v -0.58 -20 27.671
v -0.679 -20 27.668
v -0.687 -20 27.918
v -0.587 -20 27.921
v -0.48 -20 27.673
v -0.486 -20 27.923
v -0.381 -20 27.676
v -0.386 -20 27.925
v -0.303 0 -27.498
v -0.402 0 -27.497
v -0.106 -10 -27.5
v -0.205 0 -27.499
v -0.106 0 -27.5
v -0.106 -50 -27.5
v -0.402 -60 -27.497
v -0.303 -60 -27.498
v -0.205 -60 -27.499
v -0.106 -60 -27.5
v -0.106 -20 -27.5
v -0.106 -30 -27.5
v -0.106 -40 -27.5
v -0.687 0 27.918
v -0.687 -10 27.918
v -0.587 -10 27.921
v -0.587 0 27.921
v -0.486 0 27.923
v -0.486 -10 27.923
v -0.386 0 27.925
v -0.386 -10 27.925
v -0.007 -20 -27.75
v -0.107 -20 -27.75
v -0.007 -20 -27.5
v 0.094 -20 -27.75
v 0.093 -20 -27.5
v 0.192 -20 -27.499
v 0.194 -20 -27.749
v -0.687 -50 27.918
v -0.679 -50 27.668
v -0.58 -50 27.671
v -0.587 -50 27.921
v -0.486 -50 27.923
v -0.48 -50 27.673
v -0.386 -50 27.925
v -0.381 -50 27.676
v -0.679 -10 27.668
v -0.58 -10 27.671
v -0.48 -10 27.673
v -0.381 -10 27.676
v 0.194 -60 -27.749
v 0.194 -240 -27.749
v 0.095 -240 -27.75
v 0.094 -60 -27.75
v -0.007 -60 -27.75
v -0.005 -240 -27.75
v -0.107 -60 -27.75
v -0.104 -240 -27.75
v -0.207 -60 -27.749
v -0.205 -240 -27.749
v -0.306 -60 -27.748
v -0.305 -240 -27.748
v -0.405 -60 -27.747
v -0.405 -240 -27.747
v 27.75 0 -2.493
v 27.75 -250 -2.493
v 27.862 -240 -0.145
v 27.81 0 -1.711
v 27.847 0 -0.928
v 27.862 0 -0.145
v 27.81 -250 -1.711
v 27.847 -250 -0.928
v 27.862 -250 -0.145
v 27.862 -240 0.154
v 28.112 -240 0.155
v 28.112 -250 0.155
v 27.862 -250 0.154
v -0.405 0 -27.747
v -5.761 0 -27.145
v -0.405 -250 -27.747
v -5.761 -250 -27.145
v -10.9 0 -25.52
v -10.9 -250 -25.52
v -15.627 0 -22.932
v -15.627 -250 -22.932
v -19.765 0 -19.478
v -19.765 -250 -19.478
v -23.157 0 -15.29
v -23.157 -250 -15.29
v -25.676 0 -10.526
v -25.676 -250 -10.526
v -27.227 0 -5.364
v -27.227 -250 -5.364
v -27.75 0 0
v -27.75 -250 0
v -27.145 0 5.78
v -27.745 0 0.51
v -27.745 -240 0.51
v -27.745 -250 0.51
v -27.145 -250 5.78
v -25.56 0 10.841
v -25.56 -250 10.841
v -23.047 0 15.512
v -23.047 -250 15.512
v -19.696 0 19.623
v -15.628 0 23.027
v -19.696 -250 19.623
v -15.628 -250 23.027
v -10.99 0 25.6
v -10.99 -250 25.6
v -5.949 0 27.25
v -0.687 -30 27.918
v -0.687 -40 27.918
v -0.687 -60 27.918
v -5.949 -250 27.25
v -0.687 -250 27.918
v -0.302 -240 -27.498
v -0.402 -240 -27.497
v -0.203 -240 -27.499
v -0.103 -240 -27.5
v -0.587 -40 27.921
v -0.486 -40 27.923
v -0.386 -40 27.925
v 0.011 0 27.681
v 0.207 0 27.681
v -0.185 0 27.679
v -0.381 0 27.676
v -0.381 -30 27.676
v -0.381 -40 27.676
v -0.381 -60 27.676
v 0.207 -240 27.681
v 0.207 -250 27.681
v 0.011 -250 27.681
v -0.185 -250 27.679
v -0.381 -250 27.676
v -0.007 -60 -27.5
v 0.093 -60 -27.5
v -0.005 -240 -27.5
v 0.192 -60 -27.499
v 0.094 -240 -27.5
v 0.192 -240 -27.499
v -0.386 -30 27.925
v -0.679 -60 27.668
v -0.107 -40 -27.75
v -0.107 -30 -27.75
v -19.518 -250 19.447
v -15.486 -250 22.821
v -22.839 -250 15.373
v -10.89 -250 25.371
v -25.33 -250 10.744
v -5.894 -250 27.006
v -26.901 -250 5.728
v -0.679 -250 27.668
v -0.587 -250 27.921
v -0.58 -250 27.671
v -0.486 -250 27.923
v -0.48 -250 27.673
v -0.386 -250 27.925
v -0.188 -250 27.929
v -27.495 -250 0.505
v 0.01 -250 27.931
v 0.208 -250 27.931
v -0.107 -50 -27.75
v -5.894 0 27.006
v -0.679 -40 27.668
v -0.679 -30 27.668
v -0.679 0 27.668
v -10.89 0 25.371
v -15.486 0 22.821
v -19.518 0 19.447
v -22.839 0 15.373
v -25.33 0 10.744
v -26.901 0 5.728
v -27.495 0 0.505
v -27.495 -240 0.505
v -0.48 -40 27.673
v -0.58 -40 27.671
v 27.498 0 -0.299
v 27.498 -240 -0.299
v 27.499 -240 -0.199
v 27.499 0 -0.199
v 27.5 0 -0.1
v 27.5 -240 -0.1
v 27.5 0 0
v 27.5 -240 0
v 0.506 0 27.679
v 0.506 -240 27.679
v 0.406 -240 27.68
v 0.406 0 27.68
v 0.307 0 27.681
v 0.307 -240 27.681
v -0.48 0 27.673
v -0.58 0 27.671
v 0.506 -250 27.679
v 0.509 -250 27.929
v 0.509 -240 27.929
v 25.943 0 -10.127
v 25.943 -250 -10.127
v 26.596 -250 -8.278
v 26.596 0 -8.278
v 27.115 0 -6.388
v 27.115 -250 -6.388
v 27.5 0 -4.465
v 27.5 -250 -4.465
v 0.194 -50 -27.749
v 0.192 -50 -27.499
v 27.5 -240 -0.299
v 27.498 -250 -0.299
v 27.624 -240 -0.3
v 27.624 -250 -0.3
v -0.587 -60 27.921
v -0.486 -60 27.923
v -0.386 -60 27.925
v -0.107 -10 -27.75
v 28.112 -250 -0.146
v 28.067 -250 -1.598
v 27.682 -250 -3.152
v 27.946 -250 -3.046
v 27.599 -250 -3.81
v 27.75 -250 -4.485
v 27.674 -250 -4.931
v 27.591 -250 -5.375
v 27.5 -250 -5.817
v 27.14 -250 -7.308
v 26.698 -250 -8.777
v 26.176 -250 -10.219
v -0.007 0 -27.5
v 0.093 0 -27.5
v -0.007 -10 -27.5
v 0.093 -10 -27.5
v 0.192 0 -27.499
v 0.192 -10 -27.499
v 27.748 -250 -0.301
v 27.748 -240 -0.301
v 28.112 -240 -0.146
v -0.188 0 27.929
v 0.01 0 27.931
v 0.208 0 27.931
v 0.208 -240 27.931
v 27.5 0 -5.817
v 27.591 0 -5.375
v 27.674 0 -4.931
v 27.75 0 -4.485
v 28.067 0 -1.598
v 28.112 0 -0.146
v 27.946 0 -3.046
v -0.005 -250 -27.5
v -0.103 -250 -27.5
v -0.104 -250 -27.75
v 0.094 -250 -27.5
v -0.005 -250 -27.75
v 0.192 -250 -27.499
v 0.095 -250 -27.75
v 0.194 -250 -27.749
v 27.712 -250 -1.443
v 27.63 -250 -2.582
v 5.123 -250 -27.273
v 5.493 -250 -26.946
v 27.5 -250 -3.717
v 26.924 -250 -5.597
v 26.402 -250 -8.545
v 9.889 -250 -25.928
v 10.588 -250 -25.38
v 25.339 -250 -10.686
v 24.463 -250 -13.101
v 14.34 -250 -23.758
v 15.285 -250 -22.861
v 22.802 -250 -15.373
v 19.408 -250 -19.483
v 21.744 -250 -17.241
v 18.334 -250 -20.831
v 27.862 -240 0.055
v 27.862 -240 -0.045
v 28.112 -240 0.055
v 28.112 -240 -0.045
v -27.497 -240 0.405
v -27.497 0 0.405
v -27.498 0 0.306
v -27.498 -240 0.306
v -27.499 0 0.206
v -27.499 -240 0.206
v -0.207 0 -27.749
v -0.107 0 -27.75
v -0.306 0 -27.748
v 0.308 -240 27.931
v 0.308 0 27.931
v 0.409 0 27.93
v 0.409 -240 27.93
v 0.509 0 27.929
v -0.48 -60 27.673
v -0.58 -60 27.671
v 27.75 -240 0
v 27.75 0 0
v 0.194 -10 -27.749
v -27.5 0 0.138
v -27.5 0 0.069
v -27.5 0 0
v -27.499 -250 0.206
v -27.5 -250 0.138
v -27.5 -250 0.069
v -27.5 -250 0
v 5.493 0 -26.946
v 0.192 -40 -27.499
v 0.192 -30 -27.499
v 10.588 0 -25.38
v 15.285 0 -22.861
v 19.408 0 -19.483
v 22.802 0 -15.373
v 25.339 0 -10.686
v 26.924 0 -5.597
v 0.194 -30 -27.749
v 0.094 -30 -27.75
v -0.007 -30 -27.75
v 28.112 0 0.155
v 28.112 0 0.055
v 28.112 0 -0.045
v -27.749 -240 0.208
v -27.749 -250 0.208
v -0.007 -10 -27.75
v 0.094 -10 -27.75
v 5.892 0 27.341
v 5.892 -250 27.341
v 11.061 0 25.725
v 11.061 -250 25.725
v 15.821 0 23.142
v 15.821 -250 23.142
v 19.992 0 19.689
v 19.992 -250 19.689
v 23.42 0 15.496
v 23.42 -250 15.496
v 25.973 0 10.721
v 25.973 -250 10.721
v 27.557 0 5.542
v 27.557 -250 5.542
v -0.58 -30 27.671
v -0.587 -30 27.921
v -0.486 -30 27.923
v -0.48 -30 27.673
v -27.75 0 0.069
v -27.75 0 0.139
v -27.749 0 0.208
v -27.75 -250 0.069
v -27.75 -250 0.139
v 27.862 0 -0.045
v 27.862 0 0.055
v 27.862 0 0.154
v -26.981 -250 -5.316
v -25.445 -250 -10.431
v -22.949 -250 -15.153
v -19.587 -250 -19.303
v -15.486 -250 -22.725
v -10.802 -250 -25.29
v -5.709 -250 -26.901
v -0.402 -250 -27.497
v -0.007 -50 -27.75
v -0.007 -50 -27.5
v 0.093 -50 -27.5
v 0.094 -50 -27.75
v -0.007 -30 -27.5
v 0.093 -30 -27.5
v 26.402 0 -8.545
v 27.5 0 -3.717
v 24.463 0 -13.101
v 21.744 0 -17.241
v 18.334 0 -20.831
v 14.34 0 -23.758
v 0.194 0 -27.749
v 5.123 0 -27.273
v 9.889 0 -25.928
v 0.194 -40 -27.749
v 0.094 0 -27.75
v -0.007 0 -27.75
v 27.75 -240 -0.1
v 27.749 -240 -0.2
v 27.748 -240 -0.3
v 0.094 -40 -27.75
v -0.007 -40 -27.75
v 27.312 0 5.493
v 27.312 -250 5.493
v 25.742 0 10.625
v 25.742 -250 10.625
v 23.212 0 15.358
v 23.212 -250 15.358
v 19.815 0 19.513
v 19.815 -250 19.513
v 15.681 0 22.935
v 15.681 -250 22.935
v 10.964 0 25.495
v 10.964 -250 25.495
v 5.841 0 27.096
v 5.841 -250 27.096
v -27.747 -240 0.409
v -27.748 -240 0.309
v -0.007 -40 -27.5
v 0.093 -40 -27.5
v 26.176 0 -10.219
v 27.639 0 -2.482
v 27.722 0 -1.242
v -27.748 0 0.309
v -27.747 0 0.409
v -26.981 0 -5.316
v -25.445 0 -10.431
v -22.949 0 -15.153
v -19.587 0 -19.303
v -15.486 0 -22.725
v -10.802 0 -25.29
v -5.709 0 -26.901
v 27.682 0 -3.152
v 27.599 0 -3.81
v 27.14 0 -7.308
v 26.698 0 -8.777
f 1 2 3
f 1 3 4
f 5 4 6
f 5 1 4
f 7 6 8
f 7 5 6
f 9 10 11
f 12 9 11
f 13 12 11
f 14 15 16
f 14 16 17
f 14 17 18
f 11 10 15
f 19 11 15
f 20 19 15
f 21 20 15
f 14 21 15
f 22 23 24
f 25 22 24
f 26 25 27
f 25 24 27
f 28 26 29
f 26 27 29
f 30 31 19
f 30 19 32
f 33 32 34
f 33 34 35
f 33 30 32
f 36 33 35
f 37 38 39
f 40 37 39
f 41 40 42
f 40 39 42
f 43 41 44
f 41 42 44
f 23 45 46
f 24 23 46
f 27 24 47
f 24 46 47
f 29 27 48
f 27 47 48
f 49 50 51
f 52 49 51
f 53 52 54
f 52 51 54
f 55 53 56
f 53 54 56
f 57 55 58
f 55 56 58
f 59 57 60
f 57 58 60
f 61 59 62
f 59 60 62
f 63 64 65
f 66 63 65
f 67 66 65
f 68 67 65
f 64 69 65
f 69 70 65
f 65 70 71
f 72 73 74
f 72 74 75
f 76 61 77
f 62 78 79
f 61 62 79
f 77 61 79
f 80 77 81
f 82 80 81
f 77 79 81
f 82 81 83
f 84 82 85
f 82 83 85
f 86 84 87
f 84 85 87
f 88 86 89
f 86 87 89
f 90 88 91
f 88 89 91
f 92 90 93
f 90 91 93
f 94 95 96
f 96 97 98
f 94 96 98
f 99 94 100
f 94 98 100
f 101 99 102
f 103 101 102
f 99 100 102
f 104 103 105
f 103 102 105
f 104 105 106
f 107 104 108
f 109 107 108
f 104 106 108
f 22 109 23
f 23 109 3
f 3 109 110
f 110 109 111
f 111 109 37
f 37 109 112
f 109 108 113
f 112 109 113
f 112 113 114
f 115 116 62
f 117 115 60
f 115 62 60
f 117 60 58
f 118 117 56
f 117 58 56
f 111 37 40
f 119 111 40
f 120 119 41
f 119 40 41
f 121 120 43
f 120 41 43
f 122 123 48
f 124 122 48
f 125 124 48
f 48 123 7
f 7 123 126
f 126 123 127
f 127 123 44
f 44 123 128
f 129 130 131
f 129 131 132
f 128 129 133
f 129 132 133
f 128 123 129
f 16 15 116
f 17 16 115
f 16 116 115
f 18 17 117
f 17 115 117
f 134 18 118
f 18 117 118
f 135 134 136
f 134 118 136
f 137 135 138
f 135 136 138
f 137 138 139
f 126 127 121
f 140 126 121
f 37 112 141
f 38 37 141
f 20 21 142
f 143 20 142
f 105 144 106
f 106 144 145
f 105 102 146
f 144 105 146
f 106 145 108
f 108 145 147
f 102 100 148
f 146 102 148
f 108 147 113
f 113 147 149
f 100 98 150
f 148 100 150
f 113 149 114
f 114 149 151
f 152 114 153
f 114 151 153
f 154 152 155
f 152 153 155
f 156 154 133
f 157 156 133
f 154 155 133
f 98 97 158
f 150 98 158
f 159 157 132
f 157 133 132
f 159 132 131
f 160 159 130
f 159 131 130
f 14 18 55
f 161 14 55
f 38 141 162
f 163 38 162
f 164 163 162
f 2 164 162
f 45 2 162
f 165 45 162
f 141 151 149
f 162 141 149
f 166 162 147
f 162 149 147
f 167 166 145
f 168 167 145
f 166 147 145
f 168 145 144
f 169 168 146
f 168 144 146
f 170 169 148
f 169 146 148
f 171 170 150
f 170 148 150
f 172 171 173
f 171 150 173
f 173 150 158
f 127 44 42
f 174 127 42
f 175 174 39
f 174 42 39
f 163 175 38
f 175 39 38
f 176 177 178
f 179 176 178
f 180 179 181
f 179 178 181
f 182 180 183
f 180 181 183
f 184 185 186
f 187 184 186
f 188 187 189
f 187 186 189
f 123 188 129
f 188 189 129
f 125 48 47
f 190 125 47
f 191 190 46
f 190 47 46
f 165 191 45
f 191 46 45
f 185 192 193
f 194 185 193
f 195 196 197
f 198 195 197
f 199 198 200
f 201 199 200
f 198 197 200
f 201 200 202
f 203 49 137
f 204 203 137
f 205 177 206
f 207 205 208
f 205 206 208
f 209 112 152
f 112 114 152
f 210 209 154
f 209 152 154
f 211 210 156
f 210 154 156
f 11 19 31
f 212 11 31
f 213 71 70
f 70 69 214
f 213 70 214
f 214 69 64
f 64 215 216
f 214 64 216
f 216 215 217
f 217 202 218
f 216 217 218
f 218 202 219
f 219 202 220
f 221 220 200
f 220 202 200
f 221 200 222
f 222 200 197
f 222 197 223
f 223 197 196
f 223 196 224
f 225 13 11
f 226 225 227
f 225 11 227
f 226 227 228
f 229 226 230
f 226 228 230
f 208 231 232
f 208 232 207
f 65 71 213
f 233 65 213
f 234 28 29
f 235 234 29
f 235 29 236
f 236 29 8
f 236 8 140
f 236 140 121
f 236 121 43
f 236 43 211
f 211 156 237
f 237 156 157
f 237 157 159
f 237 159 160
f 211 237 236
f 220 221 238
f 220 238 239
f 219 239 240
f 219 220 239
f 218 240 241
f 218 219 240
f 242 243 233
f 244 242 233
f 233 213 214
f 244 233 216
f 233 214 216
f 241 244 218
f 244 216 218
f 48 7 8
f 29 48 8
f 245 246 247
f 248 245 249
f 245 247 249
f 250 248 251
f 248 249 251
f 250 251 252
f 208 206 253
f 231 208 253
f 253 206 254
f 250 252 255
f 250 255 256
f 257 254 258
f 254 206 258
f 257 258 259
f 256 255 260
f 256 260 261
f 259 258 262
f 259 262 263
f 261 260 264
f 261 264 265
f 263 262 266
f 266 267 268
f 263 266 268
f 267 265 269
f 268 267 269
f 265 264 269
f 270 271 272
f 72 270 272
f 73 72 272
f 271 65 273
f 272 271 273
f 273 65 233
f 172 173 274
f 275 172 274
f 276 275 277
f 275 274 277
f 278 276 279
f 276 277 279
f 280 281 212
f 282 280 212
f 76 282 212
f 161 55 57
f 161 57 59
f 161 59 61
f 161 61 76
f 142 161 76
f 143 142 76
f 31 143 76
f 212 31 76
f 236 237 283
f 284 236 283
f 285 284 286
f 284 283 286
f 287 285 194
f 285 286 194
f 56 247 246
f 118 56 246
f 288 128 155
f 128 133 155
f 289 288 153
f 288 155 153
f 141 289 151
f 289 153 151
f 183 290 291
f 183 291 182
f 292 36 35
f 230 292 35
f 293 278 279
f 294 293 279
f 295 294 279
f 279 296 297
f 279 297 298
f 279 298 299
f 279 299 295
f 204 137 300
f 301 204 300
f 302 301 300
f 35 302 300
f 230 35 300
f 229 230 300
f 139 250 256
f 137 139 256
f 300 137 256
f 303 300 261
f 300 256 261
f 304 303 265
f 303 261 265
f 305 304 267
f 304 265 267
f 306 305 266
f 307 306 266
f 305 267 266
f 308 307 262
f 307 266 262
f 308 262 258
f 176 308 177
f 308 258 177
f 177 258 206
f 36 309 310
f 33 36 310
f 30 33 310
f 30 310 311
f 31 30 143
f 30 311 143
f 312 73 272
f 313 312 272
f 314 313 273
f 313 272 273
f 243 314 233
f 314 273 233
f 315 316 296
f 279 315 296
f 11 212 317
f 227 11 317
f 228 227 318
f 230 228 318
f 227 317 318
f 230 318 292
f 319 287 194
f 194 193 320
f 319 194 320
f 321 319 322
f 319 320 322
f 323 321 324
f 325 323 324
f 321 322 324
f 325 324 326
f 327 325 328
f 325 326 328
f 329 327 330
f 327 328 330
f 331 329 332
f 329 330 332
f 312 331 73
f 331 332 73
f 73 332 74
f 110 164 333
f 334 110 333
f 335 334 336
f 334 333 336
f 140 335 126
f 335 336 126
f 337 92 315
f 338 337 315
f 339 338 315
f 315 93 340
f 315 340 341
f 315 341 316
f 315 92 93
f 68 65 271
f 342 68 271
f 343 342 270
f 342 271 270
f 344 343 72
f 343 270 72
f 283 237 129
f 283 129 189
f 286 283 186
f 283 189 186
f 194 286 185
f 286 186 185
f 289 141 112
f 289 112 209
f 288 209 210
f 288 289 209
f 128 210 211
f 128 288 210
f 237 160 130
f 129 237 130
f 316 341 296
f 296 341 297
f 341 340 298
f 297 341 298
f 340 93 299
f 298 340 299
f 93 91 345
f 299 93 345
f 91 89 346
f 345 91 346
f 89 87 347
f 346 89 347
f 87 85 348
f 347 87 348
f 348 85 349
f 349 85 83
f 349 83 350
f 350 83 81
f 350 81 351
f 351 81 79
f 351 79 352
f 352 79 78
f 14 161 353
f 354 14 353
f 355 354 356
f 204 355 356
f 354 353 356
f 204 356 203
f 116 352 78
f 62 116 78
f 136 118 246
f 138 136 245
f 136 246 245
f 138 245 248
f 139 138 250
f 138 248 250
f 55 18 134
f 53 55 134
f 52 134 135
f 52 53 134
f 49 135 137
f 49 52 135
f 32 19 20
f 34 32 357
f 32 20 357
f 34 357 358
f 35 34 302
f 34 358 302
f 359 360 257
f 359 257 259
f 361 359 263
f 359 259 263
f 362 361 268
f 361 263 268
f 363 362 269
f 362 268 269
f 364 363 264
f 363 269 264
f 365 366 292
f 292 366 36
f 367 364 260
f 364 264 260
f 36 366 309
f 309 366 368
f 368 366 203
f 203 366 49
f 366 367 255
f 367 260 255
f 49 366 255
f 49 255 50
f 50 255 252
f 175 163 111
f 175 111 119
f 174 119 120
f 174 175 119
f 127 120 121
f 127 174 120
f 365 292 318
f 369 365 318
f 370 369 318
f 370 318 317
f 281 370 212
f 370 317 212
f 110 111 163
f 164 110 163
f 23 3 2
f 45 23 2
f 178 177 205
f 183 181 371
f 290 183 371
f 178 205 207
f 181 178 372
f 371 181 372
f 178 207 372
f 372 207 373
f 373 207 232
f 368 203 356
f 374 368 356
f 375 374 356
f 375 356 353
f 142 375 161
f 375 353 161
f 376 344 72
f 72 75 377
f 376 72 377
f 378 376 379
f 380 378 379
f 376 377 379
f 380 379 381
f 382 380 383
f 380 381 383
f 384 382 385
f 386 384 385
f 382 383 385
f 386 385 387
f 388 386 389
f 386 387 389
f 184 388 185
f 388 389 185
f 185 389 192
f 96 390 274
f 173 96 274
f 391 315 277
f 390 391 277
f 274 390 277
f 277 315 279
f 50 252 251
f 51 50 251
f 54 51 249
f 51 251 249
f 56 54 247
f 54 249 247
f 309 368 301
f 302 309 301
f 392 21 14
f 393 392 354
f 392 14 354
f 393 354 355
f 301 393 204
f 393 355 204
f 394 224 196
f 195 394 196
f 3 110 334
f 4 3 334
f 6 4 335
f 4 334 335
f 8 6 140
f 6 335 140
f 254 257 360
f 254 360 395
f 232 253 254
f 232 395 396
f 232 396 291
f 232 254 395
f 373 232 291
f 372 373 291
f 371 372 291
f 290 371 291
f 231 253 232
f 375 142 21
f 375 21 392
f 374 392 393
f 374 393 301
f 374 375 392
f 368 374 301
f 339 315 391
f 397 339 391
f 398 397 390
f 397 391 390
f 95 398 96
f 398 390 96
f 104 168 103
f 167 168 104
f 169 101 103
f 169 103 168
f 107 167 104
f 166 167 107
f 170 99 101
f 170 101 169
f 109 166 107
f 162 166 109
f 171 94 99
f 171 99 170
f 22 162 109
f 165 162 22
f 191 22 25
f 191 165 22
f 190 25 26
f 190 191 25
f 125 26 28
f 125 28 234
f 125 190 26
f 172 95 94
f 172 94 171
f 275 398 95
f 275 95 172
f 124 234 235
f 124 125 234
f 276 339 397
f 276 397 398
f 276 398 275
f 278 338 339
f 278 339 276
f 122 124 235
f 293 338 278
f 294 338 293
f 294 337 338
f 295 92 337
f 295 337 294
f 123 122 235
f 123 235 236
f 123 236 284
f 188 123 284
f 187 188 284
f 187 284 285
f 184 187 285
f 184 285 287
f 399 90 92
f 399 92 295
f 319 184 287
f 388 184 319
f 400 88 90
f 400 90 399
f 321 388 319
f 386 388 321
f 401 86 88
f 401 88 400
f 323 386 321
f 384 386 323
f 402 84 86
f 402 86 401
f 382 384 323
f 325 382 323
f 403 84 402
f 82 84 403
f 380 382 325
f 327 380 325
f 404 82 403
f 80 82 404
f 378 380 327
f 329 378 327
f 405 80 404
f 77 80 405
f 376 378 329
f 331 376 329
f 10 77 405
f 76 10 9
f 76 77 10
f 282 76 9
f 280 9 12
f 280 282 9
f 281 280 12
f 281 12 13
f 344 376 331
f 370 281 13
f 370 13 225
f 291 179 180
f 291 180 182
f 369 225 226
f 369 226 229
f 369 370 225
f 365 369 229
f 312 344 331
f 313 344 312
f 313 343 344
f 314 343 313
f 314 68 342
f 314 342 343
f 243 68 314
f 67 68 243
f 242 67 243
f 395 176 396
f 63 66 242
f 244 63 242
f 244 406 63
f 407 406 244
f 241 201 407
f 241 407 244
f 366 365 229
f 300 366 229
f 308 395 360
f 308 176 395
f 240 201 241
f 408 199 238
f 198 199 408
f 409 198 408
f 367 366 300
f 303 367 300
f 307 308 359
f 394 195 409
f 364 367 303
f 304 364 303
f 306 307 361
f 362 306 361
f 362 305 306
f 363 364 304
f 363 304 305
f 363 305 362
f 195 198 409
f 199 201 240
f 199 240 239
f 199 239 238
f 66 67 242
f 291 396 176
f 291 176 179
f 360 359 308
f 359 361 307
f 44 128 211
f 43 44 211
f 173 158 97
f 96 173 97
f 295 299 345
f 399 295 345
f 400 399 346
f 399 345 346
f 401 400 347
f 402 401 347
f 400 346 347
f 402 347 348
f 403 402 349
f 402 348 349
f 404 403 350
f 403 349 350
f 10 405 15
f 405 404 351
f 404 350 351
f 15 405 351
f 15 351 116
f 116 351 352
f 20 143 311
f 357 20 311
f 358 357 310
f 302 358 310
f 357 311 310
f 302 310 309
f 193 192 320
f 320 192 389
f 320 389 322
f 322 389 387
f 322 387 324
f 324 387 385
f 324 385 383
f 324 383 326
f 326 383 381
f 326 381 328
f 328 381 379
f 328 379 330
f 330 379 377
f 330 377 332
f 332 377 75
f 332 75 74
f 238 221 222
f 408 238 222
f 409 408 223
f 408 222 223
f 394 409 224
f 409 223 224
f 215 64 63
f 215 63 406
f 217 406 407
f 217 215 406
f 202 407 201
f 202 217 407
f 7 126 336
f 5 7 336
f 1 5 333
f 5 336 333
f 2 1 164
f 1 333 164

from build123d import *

# Parameters (mm, degrees)
BASE_FLANGE1_DEPTH   = 250
UNFOLD1_START        = -250
UNFOLD1_DEPTH        = 250
UNFOLD1_2_DEPTH      = 250
SKETCH6_W            = 0.3
SKETCH6_H            = 10
CUT_EXTRUDE1_DEPTH   = 311.743338181
LPATTERN1_COUNT      = 2
LPATTERN1_PITCH      = 86.4
LPATTERN1_COUNT_DIR2 = 3
LPATTERN1_PITCH_DIR2 = 20
SKETCH7_W            = 0.3
SKETCH7_H            = 10
CUT_EXTRUDE2_DEPTH   = 311.743338181
LPATTERN2_COUNT      = 5
LPATTERN2_PITCH      = 43.4969
FOLD1_START          = -250
FOLD1_DEPTH          = 250
FOLD1_2_DEPTH        = 10
FOLD1_3_DEPTH        = 250
FOLD1_START_2        = -240
FOLD1_4_DEPTH        = 180
FOLD1_START_3        = -60
FOLD1_5_DEPTH        = 60
FOLD1_START_4        = -50
FOLD1_6_DEPTH        = 10
FOLD1_START_5        = -30
FOLD1_7_DEPTH        = 10
FOLD1_START_6        = -10
FOLD1_8_DEPTH        = 10
FOLD1_9_DEPTH        = 10


# Read off the part's stored shape, not the designer's step: Unfold1, Fold1
# Sheet-metal steps are written as plain solids
with BuildPart() as part:
    # Sketch1 → Base-Flange1 (new body)
    with BuildSketch(Plane(origin=(0, 0, 0), x_dir=(1, 0, 0), z_dir=(0, 1, 0))):
        with BuildLine():
            ThreePointArc((27.5, 0), (0, 27.5), (-27.5, 0))
            ThreePointArc((-27.5, 0), (5.334991298, -27.197244319), (25.943416257, 10.127272727))
            Line((25.943416257, 10.127272727), (26.176084396, 10.21873604))
            ThreePointArc((26.176084396, 10.21873604), (5.381536789, -27.442873139), (-27.75, 0))
            ThreePointArc((-27.75, 0), (0, 27.75), (27.75, 0))
            Line((27.75, 0), (27.5, 0))
        make_face()
    extrude(amount=-BASE_FLANGE1_DEPTH)

    # Unfold1 outline → Unfold1 (cut)
    with BuildSketch(Plane(origin=(0, 0, 0), x_dir=(1, 0, 0), z_dir=(0, 1, 0)).offset(UNFOLD1_START)):
        with BuildLine():
            Line((27.5, 4.465057679), (27.5, 5.81720394))
            ThreePointArc((27.5, 5.81720394), (26.928734746, 8.045248964), (26.176084396, 10.21873604))
            Line((26.176084396, 10.21873604), (25.943416257, 10.127272727))
            ThreePointArc((25.943416257, 10.127272727), (26.872280055, 7.337558511), (27.5, 4.465057679))
        make_face()
        with BuildLine():
            ThreePointArc((-27.75, 0), (2.431208617, -27.840474058), (27.75, 4.485307483))
            Line((27.75, 4.485307483), (27.75, 2.492962419))
            ThreePointArc((27.75, 2.492962419), (1.428992542, -27.653107247), (-27.5, 0))
            ThreePointArc((-27.5, 0), (0, 27.5), (27.5, 0))
            Line((27.5, 0), (27.5, 3.716517187))
            ThreePointArc((27.5, 3.716517187), (-1.862458053, 27.687429458), (-27.75, 0))
        make_face()
    extrude(amount=UNFOLD1_DEPTH, mode=Mode.SUBTRACT)

    # Unfold1 2 outline → Unfold1 2 (add)
    with BuildSketch(Plane(origin=(0, 0, 0), x_dir=(1, 0, 0), z_dir=(0, 1, 0)).offset(UNFOLD1_START)):
        with BuildLine():
            Line((27.5, 184.557199058), (27.5, 5.81720394))
            ThreePointArc((27.5, 5.81720394), (27.633078737, 5.152772109), (27.75, 4.485307483))
            Line((27.75, 4.485307483), (27.75, 184.557199058))
            Line((27.75, 184.557199058), (27.5, 184.557199058))
        make_face()
        with BuildLine():
            ThreePointArc((27.75, 2.492962419), (27.642708515, 3.481254935), (27.5, 4.465057679))
            Line((27.5, 4.465057679), (27.5, 3.716517187))
            ThreePointArc((27.5, 3.716517187), (27.687429458, 1.862458053), (27.75, 0))
            Line((27.75, 0), (27.75, 2.492962419))
        make_face()
    extrude(amount=UNFOLD1_2_DEPTH)

    # Sketch6 → Cut-Extrude1 (cut, through all)
    with BuildSketch(Plane(origin=(27.75, 0, 0), x_dir=(0, 0, -1), z_dir=(1, 0, 0))):
        with Locations((43.35, -15)):
            Rectangle(SKETCH6_W, SKETCH6_H)
    cut_extrude1 = extrude(amount=-CUT_EXTRUDE1_DEPTH, mode=Mode.SUBTRACT)

    # LPattern1: Cut-Extrude1 2 × 3
    with Locations(*[(0, -j * LPATTERN1_PITCH_DIR2, -i * LPATTERN1_PITCH) for i in range(LPATTERN1_COUNT) for j in range(LPATTERN1_COUNT_DIR2) if (i, j) != (0, 0)]):
        add(cut_extrude1, mode=Mode.SUBTRACT)

    # Sketch7 → Cut-Extrude2 (cut, through all)
    with BuildSketch(Plane(origin=(27.75, 0, 0), x_dir=(0, 0, -1), z_dir=(1, 0, 0))):
        with Locations((0.15, -245)):
            Rectangle(SKETCH7_W, SKETCH7_H)
    cut_extrude2 = extrude(amount=-CUT_EXTRUDE2_DEPTH, mode=Mode.SUBTRACT)

    # LPattern2: Cut-Extrude2 ×5
    with Locations(*[(0, 0, -i * LPATTERN2_PITCH) for i in range(1, LPATTERN2_COUNT)]):
        add(cut_extrude2, mode=Mode.SUBTRACT)

    # Fold1 outline → Fold1 (cut)
    with BuildSketch(Plane(origin=(0, 0, 0), x_dir=(1, 0, 0), z_dir=(0, 1, 0)).offset(FOLD1_START)):
        with BuildLine():
            Line((27.5, 4.465057679), (27.5, 3.716517187))
            ThreePointArc((27.5, 3.716517187), (27.687429458, 1.862458053), (27.75, 0))
            Line((27.75, 0), (27.75, 2.492962419))
            ThreePointArc((27.75, 2.492962419), (27.642708515, 3.481254935), (27.5, 4.465057679))
        make_face()
        with BuildLine():
            ThreePointArc((27.5, 5.81720394), (27.633078737, 5.152772109), (27.75, 4.485307483))
            Line((27.75, 4.485307483), (27.75, 184.557199058))
            Line((27.75, 184.557199058), (27.5, 184.557199058))
            Line((27.5, 184.557199058), (27.5, 5.81720394))
        make_face()
    extrude(amount=FOLD1_DEPTH, mode=Mode.SUBTRACT)

    # Fold1 2 outline → Fold1 2 (cut)
    with BuildSketch(Plane(origin=(0, 0, 0), x_dir=(1, 0, 0), z_dir=(0, 1, 0)).offset(FOLD1_START)):
        with BuildLine():
            ThreePointArc((27.748378331, 0.3), (27.748371017, 0.300675772), (27.748363686, 0.301351543))
            Line((27.748363686, 0.301351543), (27.623914005, 0.3))
            Line((27.623914005, 0.3), (27.748378331, 0.3))
        make_face()
    extrude(amount=FOLD1_2_DEPTH, mode=Mode.SUBTRACT)

    # Fold1 3 outline → Fold1 3 (add)
    with BuildSketch(Plane(origin=(0, 0, 0), x_dir=(1, 0, 0), z_dir=(0, 1, 0)).offset(FOLD1_START)):
        with BuildLine():
            Line((0.194121372, 27.749321017), (0.192372531, 27.499327134))
            ThreePointArc((0.192372531, 27.499327134), (19.407828644, 19.482971727), (27.498378428, 0.298636664))
            Line((27.498378428, 0.298636664), (27.623914005, 0.3))
            Line((27.623914005, 0.3), (27.5, 0.3))
            Line((27.5, 0.3), (27.5, 3.716517187))
            ThreePointArc((27.5, 3.716517187), (18.333984963, 20.830926417), (0.194121372, 27.749321017))
        make_face()
        with BuildLine():
            ThreePointArc((25.943416257, 10.127272727), (26.872280055, 7.337558511), (27.5, 4.465057679))
            Line((27.5, 4.465057679), (27.5, 5.81720394))
            ThreePointArc((27.5, 5.81720394), (26.928734746, 8.045248964), (26.176084396, 10.21873604))
            Line((26.176084396, 10.21873604), (25.943416257, 10.127272727))
        make_face()
        with BuildLine():
            ThreePointArc((-27.5, 0), (-19.586982848, 19.302852196), (-0.401810697, 27.497064355))
            Line((-0.401810697, 27.497064355), (-0.405463521, 27.747037668))
            ThreePointArc((-0.405463521, 27.747037668), (-19.765046328, 19.478332671), (-27.75, 0))
            ThreePointArc((-27.75, 0), (-27.749805944, -0.104117185), (-27.74922378, -0.208232924))
            Line((-27.74922378, -0.208232924), (-27.499230728, -0.206369125))
            ThreePointArc((-27.499230728, -0.206369125), (-27.499807681, -0.103185279), (-27.5, 0))
        make_face()
        with BuildLine():
            Line((27.75, 4.485307483), (27.75, 2.492962419))
            ThreePointArc((27.75, 2.492962419), (27.830997978, 1.319952212), (27.86210871, 0.144560473))
            Line((27.86210871, 0.144560473), (28.112105301, 0.145866054))
            ThreePointArc((28.112105301, 0.145866054), (28.015747193, 2.322654117), (27.75, 4.485307483))
        make_face()
        with BuildLine():
            Line((28.112053433, -0.155481098), (27.862057305, -0.154089457))
            ThreePointArc((27.862057305, -0.154089457), (19.815096757, -19.513149653), (0.506027414, -27.679337678))
            Line((0.506027414, -27.679337678), (0.508960666, -27.929320469))
            ThreePointArc((0.508960666, -27.929320469), (19.992417674, -19.689380446), (28.112053433, -0.155481098))
        make_face()
        with BuildLine():
            ThreePointArc((-0.67917386, -27.667867677), (-19.517647079, -19.447492002), (-27.49539326, -0.504994403))
            Line((-27.49539326, -0.504994403), (-27.745351655, -0.509555202))
            ThreePointArc((-27.745351655, -0.509555202), (-19.695555366, -19.623129815), (-0.686944618, -27.917746878))
            Line((-0.686944618, -27.917746878), (-0.67917386, -27.667867677))
        make_face()
        with BuildLine():
            Line((0.207619564, -27.931230638), (0.20738348, -27.681230749))
            ThreePointArc((0.20738348, -27.681230749), (-0.08663462, -27.679946905), (-0.380622499, -27.675540215))
            Line((-0.380622499, -27.675540215), (-0.385696924, -27.92548871))
            ThreePointArc((-0.385696924, -27.92548871), (-0.089053927, -27.929935198), (0.207619564, -27.931230638))
        make_face()
    extrude(amount=FOLD1_3_DEPTH)

    # Fold1 4 outline → Fold1 4 (add)
    with BuildSketch(Plane(origin=(0, 0, 0), x_dir=(1, 0, 0), z_dir=(0, 1, 0)).offset(FOLD1_START_2)):
        with BuildLine():
            Line((0.192372531, 27.499327134), (0.194121372, 27.749321017))
            ThreePointArc((0.194121372, 27.749321017), (-0.105677242, 27.74979878), (-0.405463521, 27.747037668))
            Line((-0.405463521, 27.747037668), (-0.401810697, 27.497064355))
            ThreePointArc((-0.401810697, 27.497064355), (-0.104725195, 27.499800593), (0.192372531, 27.499327134))
        make_face()
        with BuildLine():
            Line((27.5, 0.298654275), (27.498378428, 0.298636664))
            ThreePointArc((27.498378428, 0.298636664), (27.499594604, 0.149320533), (27.5, 0))
            Line((27.5, 0), (27.5, 0.298654275))
        make_face()
        with BuildLine():
            Line((28.112105301, 0.145866054), (27.86210871, 0.144560473))
            ThreePointArc((27.86210871, 0.144560473), (27.862485773, -0.004764561), (27.862057305, -0.154089457))
            Line((27.862057305, -0.154089457), (28.112053433, -0.155481098))
            ThreePointArc((28.112053433, -0.155481098), (28.11248577, -0.004807592), (28.112105301, 0.145866054))
        make_face()
        with BuildLine():
            ThreePointArc((-27.49539326, -0.504994403), (-27.497714727, -0.355686939), (-27.499230728, -0.206369125))
            Line((-27.499230728, -0.206369125), (-27.74922378, -0.208232924))
            ThreePointArc((-27.74922378, -0.208232924), (-27.747694087, -0.358899285), (-27.745351655, -0.509555202))
            Line((-27.745351655, -0.509555202), (-27.49539326, -0.504994403))
        make_face()
        with BuildLine():
            Line((0.508960666, -27.929320469), (0.506027414, -27.679337678))
            ThreePointArc((0.506027414, -27.679337678), (0.356708, -27.680686971), (0.20738348, -27.681230749))
            Line((0.20738348, -27.681230749), (0.207619564, -27.931230638))
            ThreePointArc((0.207619564, -27.931230638), (0.358292691, -27.930681948), (0.508960666, -27.929320469))
        make_face()
        with BuildLine():
            ThreePointArc((-0.380622499, -27.675540215), (-0.529908527, -27.672106579), (-0.67917386, -27.667867677))
            Line((-0.67917386, -27.667867677), (-0.686944618, -27.917746878))
            ThreePointArc((-0.686944618, -27.917746878), (-0.536331212, -27.922024063), (-0.385696924, -27.92548871))
            Line((-0.385696924, -27.92548871), (-0.380622499, -27.675540215))
        make_face()
    extrude(amount=FOLD1_4_DEPTH)

    # Fold1 5 outline → Fold1 5 (add)
    with BuildSketch(Plane(origin=(0, 0, 0), x_dir=(1, 0, 0), z_dir=(0, 1, 0)).offset(FOLD1_START_3)):
        with BuildLine():
            Line((27.5, 0.298654275), (27.498378428, 0.298636664))
            ThreePointArc((27.498378428, 0.298636664), (27.499594604, 0.149320533), (27.5, 0))
            Line((27.5, 0), (27.5, 0.298654275))
        make_face()
        with BuildLine():
            ThreePointArc((-0.401810697, 27.497064355), (-0.254043101, 27.498826559), (-0.106268169, 27.499794673))
            Line((-0.106268169, 27.499794673), (-0.107234244, 27.749792807))
            ThreePointArc((-0.107234244, 27.749792807), (-0.256352584, 27.748815891), (-0.405463521, 27.747037668))
            Line((-0.405463521, 27.747037668), (-0.401810697, 27.497064355))
        make_face()
        with BuildLine():
            Line((28.112105301, 0.145866054), (27.86210871, 0.144560473))
            ThreePointArc((27.86210871, 0.144560473), (27.862485773, -0.004764561), (27.862057305, -0.154089457))
            Line((27.862057305, -0.154089457), (28.112053433, -0.155481098))
            ThreePointArc((28.112053433, -0.155481098), (28.11248577, -0.004807592), (28.112105301, 0.145866054))
        make_face()
        with BuildLine():
            ThreePointArc((-27.49539326, -0.504994403), (-27.497714727, -0.355686939), (-27.499230728, -0.206369125))
            Line((-27.499230728, -0.206369125), (-27.74922378, -0.208232924))
            ThreePointArc((-27.74922378, -0.208232924), (-27.747694087, -0.358899285), (-27.745351655, -0.509555202))
            Line((-27.745351655, -0.509555202), (-27.49539326, -0.504994403))
        make_face()
        with BuildLine():
            Line((0.508960666, -27.929320469), (0.506027414, -27.679337678))
            ThreePointArc((0.506027414, -27.679337678), (0.356708, -27.680686971), (0.20738348, -27.681230749))
            Line((0.20738348, -27.681230749), (0.207619564, -27.931230638))
            ThreePointArc((0.207619564, -27.931230638), (0.358292691, -27.930681948), (0.508960666, -27.929320469))
        make_face()
    extrude(amount=FOLD1_5_DEPTH)

    # Fold1 6 outline → Fold1 6 (add)
    with BuildSketch(Plane(origin=(0, 0, 0), x_dir=(1, 0, 0), z_dir=(0, 1, 0)).offset(FOLD1_START_4)):
        with BuildLine():
            Line((0.192372531, 27.499327134), (0.194121372, 27.749321017))
            ThreePointArc((0.194121372, 27.749321017), (0.043444204, 27.749965993), (-0.107234244, 27.749792807))
            Line((-0.107234244, 27.749792807), (-0.106268169, 27.499794673))
            ThreePointArc((-0.106268169, 27.499794673), (0.043052816, 27.499966299), (0.192372531, 27.499327134))
        make_face()
        with BuildLine():
            ThreePointArc((-0.380622499, -27.675540215), (-0.529908527, -27.672106579), (-0.67917386, -27.667867677))
            Line((-0.67917386, -27.667867677), (-0.686944618, -27.917746878))
            ThreePointArc((-0.686944618, -27.917746878), (-0.536331212, -27.922024063), (-0.385696924, -27.92548871))
            Line((-0.385696924, -27.92548871), (-0.380622499, -27.675540215))
        make_face()
    extrude(amount=FOLD1_6_DEPTH)

    # Fold1 7 outline → Fold1 7 (add)
    with BuildSketch(Plane(origin=(0, 0, 0), x_dir=(1, 0, 0), z_dir=(0, 1, 0)).offset(FOLD1_START_5)):
        with BuildLine():
            Line((0.192372531, 27.499327134), (0.194121372, 27.749321017))
            ThreePointArc((0.194121372, 27.749321017), (0.043444204, 27.749965993), (-0.107234244, 27.749792807))
            Line((-0.107234244, 27.749792807), (-0.106268169, 27.499794673))
            ThreePointArc((-0.106268169, 27.499794673), (0.043052816, 27.499966299), (0.192372531, 27.499327134))
        make_face()
        with BuildLine():
            ThreePointArc((-0.380622499, -27.675540215), (-0.529908527, -27.672106579), (-0.67917386, -27.667867677))
            Line((-0.67917386, -27.667867677), (-0.686944618, -27.917746878))
            ThreePointArc((-0.686944618, -27.917746878), (-0.536331212, -27.922024063), (-0.385696924, -27.92548871))
            Line((-0.385696924, -27.92548871), (-0.380622499, -27.675540215))
        make_face()
    extrude(amount=FOLD1_7_DEPTH)

    # Fold1 8 outline → Fold1 8 (add)
    with BuildSketch(Plane(origin=(0, 0, 0), x_dir=(1, 0, 0), z_dir=(0, 1, 0)).offset(FOLD1_START_6)):
        with BuildLine():
            Line((0.192372531, 27.499327134), (0.194121372, 27.749321017))
            ThreePointArc((0.194121372, 27.749321017), (0.043444204, 27.749965993), (-0.107234244, 27.749792807))
            Line((-0.107234244, 27.749792807), (-0.106268169, 27.499794673))
            ThreePointArc((-0.106268169, 27.499794673), (0.043052816, 27.499966299), (0.192372531, 27.499327134))
        make_face()
        with BuildLine():
            ThreePointArc((-0.380622499, -27.675540215), (-0.529908527, -27.672106579), (-0.67917386, -27.667867677))
            Line((-0.67917386, -27.667867677), (-0.686944618, -27.917746878))
            ThreePointArc((-0.686944618, -27.917746878), (-0.536331212, -27.922024063), (-0.385696924, -27.92548871))
            Line((-0.385696924, -27.92548871), (-0.380622499, -27.675540215))
        make_face()
    extrude(amount=FOLD1_8_DEPTH)

    # Fold1 9 outline → Fold1 9 (add)
    with BuildSketch(Plane(origin=(0, 0, 0), x_dir=(1, 0, 0), z_dir=(0, 1, 0)).offset(FOLD1_START)):
        with BuildLine():
            ThreePointArc((-0.103182219, 27.499806425), (0.0445958, 27.49996384), (0.192372531, 27.499327134))
            Line((0.192372531, 27.499327134), (0.194121372, 27.749321017))
            ThreePointArc((0.194121372, 27.749321017), (0.045001216, 27.749963512), (-0.104120239, 27.749804666))
            Line((-0.104120239, 27.749804666), (-0.103182219, 27.499806425))
        make_face()
        with BuildLine():
            ThreePointArc((-0.380622499, -27.675540215), (-0.529908527, -27.672106579), (-0.67917386, -27.667867677))
            Line((-0.67917386, -27.667867677), (-0.686944618, -27.917746878))
            ThreePointArc((-0.686944618, -27.917746878), (-0.536331212, -27.922024063), (-0.385696924, -27.92548871))
            Line((-0.385696924, -27.92548871), (-0.380622499, -27.675540215))
        make_face()
    extrude(amount=FOLD1_9_DEPTH)


solid = part.part
